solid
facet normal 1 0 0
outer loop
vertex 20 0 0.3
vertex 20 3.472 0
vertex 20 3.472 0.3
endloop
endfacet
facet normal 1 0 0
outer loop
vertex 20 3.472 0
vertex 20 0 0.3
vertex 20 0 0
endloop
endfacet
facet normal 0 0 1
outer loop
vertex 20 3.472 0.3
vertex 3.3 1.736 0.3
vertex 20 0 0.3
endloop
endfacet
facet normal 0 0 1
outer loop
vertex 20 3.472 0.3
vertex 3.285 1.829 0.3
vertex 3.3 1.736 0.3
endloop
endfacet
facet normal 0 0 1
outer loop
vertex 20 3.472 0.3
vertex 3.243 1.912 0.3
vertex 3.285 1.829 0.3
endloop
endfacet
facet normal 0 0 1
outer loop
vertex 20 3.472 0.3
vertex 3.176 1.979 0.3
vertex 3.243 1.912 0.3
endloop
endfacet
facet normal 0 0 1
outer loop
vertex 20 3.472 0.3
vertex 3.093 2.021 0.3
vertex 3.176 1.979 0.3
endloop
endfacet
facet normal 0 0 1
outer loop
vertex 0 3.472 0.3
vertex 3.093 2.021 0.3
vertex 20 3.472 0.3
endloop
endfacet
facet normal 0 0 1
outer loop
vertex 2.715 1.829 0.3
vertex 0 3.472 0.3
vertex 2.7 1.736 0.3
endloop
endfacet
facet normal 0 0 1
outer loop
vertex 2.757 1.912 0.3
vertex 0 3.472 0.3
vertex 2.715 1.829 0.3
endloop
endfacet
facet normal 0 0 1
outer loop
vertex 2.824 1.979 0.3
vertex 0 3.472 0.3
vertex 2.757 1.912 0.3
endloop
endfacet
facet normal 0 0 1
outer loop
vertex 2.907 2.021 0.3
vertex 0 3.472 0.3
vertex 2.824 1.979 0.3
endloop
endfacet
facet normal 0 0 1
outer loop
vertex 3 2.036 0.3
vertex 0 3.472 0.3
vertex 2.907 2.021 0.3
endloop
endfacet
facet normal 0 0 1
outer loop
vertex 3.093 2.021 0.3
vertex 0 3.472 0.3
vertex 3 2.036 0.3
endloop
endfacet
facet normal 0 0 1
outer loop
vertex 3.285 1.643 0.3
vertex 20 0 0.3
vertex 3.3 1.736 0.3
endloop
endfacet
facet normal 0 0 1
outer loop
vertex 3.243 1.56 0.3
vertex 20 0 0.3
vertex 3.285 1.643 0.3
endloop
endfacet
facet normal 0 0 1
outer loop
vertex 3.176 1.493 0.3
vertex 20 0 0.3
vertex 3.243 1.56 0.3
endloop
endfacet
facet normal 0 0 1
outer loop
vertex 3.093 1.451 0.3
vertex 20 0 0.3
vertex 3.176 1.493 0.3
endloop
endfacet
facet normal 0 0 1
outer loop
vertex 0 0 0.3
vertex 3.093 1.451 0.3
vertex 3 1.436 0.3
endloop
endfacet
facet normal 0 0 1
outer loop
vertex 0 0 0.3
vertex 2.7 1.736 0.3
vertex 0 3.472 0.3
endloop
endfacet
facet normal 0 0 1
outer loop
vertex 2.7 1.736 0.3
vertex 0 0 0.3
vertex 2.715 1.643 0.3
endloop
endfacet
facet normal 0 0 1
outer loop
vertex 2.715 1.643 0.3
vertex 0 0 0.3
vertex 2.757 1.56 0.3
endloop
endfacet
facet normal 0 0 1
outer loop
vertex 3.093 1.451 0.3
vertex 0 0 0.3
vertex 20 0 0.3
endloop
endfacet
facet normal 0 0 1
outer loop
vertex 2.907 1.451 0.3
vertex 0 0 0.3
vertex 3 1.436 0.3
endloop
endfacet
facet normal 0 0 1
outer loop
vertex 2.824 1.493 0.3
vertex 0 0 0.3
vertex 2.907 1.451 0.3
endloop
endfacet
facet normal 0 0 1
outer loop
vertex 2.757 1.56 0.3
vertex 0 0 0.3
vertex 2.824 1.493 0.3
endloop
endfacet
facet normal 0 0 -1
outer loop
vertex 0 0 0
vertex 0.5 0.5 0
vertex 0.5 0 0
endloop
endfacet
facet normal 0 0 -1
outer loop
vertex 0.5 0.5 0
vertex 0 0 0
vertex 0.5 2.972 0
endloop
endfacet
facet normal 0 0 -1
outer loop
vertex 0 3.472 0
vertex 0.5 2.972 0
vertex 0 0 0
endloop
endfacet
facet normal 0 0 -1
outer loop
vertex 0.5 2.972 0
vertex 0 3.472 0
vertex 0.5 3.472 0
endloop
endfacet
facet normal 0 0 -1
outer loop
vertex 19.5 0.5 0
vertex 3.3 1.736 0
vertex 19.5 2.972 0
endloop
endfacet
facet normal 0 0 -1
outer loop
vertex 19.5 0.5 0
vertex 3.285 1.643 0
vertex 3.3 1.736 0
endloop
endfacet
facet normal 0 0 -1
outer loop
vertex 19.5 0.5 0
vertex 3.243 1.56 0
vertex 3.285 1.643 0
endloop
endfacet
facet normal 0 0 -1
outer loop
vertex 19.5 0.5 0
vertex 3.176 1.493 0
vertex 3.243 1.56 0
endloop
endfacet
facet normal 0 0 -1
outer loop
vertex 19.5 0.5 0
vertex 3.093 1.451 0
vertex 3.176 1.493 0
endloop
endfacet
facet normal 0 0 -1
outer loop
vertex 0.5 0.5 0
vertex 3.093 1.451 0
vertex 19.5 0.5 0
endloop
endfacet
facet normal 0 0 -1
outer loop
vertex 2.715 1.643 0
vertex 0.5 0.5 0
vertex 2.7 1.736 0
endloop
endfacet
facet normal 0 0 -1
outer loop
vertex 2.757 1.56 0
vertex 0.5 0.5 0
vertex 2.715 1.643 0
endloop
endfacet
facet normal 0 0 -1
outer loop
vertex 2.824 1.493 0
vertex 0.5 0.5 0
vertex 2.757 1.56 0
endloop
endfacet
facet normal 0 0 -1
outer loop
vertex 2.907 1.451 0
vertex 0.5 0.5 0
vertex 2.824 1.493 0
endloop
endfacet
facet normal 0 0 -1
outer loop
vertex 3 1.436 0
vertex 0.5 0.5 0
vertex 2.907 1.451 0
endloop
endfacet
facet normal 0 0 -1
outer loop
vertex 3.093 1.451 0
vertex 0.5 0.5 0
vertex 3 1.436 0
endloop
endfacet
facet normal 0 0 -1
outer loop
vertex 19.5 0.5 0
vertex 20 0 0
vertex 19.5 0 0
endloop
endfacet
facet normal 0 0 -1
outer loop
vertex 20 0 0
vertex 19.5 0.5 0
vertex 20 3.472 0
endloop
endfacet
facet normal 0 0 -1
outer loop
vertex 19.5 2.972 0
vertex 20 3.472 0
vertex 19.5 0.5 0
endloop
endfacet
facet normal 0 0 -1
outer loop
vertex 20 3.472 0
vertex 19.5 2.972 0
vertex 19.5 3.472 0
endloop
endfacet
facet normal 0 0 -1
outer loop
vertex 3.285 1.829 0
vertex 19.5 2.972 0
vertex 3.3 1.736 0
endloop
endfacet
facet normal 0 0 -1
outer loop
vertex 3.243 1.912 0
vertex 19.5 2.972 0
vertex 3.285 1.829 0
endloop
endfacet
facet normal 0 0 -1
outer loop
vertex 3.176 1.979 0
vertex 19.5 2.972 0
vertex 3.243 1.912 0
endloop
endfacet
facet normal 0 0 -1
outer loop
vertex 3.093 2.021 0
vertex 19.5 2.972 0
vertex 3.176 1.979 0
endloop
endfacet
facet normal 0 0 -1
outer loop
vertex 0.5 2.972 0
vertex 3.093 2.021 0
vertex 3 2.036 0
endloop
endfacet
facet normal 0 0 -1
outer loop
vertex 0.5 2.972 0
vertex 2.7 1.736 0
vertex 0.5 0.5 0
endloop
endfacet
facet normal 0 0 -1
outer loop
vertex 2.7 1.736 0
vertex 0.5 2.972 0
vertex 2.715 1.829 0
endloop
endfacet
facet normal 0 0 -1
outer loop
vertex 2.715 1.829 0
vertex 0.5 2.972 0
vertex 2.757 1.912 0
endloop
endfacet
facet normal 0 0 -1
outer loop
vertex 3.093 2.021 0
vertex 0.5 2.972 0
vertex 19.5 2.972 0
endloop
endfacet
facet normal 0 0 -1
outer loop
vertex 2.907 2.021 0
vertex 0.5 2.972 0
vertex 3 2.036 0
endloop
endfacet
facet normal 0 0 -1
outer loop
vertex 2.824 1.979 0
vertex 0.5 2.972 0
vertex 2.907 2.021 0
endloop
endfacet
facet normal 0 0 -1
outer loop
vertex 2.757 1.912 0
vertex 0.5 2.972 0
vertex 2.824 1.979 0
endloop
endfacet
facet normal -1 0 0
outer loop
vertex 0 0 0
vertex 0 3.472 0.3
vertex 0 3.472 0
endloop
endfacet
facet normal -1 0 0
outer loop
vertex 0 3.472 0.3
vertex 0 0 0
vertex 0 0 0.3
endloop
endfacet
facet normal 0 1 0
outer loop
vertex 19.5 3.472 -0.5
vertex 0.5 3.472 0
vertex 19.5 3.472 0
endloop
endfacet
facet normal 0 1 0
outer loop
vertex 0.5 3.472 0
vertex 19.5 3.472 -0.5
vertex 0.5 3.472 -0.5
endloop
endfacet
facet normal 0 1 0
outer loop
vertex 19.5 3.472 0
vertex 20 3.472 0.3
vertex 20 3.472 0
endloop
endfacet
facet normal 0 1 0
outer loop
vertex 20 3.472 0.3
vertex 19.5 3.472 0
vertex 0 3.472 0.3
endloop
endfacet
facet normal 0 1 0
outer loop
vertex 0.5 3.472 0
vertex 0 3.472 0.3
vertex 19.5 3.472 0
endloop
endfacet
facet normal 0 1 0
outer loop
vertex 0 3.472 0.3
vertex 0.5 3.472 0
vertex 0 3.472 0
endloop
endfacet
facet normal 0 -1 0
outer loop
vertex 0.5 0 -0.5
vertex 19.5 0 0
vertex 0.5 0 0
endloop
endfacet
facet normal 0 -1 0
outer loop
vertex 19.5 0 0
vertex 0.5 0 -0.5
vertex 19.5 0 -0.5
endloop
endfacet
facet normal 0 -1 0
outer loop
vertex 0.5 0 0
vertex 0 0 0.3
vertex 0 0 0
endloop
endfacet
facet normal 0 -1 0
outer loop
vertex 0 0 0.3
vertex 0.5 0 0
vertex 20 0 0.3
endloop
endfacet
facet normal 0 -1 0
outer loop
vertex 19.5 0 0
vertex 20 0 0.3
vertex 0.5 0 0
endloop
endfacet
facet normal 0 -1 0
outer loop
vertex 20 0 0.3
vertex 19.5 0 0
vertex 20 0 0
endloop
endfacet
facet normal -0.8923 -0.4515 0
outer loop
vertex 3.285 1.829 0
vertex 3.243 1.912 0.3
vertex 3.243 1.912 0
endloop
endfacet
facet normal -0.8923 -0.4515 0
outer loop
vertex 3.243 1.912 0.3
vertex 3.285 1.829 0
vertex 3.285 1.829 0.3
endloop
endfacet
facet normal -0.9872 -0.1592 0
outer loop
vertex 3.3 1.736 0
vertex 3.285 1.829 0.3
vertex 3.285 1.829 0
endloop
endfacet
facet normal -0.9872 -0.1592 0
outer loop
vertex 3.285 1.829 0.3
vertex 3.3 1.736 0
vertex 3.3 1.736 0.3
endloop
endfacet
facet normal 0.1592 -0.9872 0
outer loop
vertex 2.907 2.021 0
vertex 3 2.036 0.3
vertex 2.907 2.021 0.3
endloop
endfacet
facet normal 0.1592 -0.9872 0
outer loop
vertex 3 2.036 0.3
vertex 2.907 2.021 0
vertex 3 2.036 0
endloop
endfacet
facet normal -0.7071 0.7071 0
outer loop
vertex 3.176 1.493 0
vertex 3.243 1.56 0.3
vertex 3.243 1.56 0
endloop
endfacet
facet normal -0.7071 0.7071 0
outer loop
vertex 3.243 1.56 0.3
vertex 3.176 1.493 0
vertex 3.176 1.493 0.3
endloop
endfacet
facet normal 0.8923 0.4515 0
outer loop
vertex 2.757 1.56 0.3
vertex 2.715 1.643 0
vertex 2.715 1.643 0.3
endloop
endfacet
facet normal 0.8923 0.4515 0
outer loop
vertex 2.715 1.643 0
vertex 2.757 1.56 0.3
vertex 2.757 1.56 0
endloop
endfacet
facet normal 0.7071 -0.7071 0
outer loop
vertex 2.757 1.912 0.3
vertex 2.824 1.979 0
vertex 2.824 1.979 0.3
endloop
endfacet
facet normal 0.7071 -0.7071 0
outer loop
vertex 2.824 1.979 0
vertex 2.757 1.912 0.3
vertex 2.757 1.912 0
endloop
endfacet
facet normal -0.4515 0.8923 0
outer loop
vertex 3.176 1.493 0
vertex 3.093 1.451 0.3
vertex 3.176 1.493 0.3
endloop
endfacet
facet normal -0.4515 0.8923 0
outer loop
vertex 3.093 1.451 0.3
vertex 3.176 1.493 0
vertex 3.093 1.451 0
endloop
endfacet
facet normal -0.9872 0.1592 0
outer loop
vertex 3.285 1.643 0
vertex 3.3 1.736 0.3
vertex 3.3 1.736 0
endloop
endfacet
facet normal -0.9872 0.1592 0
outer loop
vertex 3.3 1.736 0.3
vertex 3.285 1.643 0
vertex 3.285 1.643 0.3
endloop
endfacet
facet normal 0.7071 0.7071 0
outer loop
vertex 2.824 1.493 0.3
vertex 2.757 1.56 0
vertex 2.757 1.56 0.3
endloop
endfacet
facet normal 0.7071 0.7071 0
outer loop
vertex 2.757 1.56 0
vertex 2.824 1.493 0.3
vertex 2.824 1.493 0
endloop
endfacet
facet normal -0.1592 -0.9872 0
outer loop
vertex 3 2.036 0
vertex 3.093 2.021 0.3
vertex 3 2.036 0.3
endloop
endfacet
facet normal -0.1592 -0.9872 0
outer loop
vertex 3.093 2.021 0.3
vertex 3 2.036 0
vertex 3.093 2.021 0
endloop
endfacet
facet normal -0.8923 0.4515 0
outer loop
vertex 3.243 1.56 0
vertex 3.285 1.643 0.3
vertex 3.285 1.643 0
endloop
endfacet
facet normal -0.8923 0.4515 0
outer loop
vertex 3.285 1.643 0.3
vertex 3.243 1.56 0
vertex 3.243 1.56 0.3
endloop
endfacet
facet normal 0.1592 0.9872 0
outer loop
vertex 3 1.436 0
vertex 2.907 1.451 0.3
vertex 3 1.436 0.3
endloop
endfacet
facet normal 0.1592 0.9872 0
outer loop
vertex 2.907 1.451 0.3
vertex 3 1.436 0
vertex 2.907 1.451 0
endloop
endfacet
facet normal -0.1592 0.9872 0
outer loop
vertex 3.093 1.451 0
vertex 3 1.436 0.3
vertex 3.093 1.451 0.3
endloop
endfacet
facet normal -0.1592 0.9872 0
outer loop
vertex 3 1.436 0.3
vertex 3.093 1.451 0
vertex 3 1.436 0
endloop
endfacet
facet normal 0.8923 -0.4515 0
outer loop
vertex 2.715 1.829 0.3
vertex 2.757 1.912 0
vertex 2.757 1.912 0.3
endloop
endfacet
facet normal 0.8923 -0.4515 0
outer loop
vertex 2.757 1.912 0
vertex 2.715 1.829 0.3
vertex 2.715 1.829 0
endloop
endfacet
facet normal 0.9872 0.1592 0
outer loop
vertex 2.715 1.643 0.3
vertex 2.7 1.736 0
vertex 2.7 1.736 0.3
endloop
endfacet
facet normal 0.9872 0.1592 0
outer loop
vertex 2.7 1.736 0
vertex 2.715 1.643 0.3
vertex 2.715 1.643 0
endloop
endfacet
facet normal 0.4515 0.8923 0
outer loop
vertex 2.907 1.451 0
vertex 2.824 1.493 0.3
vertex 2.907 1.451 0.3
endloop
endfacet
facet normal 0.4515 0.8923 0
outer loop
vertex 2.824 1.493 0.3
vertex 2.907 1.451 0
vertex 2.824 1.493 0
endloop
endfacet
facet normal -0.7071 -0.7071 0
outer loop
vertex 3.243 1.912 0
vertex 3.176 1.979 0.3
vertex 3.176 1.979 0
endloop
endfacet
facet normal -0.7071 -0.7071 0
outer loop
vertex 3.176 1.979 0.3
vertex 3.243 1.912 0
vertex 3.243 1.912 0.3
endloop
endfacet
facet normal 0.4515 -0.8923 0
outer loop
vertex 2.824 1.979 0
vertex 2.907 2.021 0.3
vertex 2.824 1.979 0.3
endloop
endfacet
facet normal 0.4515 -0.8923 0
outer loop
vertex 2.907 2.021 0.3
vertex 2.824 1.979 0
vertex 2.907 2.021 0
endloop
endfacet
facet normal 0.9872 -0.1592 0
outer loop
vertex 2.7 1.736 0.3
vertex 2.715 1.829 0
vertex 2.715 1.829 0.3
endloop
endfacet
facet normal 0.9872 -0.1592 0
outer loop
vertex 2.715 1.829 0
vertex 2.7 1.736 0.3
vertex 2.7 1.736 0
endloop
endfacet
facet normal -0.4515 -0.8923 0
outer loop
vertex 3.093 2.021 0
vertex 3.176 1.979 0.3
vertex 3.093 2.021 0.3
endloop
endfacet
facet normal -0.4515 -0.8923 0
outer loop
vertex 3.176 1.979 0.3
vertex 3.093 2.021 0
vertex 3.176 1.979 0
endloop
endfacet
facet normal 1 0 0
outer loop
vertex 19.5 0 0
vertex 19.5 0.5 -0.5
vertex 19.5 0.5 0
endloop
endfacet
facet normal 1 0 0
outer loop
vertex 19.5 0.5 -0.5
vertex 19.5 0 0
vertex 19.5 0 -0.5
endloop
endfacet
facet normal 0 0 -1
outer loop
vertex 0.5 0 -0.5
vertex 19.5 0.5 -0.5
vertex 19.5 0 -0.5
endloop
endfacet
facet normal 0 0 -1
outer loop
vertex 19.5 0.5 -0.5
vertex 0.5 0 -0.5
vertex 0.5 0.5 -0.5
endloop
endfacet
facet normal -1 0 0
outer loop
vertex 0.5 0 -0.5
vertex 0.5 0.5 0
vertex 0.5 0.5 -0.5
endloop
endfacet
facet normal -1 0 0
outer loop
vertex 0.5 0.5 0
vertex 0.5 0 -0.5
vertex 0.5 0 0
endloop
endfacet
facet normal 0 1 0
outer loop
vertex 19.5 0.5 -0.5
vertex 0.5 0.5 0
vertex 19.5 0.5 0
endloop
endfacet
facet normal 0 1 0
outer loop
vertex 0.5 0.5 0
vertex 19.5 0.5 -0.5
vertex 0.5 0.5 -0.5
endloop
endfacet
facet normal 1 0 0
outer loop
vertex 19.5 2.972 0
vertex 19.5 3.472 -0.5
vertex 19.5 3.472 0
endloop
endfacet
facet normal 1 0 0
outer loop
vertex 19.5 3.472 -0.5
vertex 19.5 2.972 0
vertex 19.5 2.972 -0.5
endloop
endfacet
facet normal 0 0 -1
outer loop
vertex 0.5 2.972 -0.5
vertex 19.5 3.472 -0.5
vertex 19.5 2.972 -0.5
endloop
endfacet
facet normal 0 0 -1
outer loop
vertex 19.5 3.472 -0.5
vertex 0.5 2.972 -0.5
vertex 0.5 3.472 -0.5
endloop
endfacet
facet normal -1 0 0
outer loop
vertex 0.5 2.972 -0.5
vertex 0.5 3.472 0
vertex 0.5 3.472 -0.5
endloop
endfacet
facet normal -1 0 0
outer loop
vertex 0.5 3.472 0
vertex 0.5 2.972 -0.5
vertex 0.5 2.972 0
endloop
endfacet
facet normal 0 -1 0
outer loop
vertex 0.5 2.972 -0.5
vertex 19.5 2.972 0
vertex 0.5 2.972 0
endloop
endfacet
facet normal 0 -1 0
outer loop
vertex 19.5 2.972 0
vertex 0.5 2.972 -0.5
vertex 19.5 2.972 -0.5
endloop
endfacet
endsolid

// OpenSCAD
// file: global.scad
$fn = 20;

epsilon = 0.005;
epsilon2 = epsilon * 2;

width = 20;
height = 5.5;
depth = 15;
thickness = 0.3;

explode_dist = 10;
// main file
include <global.scad>;

module part6()
{
    h = height + 5 * sin(30) - 8 * sin(35);
    l = 8 * cos(35) - 5 * cos(30);
    d = sqrt(h * h + l * l) - 2 * thickness;
    color("SaddleBrown") difference()
    {
        cube(size = [width, d, thickness]);
        // antenna hole
        translate([3, d / 2, -epsilon]) cylinder(d = 0.6, h = thickness + epsilon2);
    }
}

module part6_skeleton()
{
    h = height + 5 * sin(30) - 8 * sin(35);
    l = 8 * cos(35) - 5 * cos(30);
    d = sqrt(h * h + l * l) - 2 * thickness;   
    color("SaddleBrown")
    {
        translate([0.5, 0, -0.5]) cube(size = [width - 1, 0.5, 0.5]);
        translate([0.5, d - 0.5, -0.5]) cube(size = [width - 1, 0.5, 0.5]);
    }
}

module part6_2d()
{
    projection()
    {
        part6();
        part6_skeleton();
    }
}

part6();
part6_skeleton();
